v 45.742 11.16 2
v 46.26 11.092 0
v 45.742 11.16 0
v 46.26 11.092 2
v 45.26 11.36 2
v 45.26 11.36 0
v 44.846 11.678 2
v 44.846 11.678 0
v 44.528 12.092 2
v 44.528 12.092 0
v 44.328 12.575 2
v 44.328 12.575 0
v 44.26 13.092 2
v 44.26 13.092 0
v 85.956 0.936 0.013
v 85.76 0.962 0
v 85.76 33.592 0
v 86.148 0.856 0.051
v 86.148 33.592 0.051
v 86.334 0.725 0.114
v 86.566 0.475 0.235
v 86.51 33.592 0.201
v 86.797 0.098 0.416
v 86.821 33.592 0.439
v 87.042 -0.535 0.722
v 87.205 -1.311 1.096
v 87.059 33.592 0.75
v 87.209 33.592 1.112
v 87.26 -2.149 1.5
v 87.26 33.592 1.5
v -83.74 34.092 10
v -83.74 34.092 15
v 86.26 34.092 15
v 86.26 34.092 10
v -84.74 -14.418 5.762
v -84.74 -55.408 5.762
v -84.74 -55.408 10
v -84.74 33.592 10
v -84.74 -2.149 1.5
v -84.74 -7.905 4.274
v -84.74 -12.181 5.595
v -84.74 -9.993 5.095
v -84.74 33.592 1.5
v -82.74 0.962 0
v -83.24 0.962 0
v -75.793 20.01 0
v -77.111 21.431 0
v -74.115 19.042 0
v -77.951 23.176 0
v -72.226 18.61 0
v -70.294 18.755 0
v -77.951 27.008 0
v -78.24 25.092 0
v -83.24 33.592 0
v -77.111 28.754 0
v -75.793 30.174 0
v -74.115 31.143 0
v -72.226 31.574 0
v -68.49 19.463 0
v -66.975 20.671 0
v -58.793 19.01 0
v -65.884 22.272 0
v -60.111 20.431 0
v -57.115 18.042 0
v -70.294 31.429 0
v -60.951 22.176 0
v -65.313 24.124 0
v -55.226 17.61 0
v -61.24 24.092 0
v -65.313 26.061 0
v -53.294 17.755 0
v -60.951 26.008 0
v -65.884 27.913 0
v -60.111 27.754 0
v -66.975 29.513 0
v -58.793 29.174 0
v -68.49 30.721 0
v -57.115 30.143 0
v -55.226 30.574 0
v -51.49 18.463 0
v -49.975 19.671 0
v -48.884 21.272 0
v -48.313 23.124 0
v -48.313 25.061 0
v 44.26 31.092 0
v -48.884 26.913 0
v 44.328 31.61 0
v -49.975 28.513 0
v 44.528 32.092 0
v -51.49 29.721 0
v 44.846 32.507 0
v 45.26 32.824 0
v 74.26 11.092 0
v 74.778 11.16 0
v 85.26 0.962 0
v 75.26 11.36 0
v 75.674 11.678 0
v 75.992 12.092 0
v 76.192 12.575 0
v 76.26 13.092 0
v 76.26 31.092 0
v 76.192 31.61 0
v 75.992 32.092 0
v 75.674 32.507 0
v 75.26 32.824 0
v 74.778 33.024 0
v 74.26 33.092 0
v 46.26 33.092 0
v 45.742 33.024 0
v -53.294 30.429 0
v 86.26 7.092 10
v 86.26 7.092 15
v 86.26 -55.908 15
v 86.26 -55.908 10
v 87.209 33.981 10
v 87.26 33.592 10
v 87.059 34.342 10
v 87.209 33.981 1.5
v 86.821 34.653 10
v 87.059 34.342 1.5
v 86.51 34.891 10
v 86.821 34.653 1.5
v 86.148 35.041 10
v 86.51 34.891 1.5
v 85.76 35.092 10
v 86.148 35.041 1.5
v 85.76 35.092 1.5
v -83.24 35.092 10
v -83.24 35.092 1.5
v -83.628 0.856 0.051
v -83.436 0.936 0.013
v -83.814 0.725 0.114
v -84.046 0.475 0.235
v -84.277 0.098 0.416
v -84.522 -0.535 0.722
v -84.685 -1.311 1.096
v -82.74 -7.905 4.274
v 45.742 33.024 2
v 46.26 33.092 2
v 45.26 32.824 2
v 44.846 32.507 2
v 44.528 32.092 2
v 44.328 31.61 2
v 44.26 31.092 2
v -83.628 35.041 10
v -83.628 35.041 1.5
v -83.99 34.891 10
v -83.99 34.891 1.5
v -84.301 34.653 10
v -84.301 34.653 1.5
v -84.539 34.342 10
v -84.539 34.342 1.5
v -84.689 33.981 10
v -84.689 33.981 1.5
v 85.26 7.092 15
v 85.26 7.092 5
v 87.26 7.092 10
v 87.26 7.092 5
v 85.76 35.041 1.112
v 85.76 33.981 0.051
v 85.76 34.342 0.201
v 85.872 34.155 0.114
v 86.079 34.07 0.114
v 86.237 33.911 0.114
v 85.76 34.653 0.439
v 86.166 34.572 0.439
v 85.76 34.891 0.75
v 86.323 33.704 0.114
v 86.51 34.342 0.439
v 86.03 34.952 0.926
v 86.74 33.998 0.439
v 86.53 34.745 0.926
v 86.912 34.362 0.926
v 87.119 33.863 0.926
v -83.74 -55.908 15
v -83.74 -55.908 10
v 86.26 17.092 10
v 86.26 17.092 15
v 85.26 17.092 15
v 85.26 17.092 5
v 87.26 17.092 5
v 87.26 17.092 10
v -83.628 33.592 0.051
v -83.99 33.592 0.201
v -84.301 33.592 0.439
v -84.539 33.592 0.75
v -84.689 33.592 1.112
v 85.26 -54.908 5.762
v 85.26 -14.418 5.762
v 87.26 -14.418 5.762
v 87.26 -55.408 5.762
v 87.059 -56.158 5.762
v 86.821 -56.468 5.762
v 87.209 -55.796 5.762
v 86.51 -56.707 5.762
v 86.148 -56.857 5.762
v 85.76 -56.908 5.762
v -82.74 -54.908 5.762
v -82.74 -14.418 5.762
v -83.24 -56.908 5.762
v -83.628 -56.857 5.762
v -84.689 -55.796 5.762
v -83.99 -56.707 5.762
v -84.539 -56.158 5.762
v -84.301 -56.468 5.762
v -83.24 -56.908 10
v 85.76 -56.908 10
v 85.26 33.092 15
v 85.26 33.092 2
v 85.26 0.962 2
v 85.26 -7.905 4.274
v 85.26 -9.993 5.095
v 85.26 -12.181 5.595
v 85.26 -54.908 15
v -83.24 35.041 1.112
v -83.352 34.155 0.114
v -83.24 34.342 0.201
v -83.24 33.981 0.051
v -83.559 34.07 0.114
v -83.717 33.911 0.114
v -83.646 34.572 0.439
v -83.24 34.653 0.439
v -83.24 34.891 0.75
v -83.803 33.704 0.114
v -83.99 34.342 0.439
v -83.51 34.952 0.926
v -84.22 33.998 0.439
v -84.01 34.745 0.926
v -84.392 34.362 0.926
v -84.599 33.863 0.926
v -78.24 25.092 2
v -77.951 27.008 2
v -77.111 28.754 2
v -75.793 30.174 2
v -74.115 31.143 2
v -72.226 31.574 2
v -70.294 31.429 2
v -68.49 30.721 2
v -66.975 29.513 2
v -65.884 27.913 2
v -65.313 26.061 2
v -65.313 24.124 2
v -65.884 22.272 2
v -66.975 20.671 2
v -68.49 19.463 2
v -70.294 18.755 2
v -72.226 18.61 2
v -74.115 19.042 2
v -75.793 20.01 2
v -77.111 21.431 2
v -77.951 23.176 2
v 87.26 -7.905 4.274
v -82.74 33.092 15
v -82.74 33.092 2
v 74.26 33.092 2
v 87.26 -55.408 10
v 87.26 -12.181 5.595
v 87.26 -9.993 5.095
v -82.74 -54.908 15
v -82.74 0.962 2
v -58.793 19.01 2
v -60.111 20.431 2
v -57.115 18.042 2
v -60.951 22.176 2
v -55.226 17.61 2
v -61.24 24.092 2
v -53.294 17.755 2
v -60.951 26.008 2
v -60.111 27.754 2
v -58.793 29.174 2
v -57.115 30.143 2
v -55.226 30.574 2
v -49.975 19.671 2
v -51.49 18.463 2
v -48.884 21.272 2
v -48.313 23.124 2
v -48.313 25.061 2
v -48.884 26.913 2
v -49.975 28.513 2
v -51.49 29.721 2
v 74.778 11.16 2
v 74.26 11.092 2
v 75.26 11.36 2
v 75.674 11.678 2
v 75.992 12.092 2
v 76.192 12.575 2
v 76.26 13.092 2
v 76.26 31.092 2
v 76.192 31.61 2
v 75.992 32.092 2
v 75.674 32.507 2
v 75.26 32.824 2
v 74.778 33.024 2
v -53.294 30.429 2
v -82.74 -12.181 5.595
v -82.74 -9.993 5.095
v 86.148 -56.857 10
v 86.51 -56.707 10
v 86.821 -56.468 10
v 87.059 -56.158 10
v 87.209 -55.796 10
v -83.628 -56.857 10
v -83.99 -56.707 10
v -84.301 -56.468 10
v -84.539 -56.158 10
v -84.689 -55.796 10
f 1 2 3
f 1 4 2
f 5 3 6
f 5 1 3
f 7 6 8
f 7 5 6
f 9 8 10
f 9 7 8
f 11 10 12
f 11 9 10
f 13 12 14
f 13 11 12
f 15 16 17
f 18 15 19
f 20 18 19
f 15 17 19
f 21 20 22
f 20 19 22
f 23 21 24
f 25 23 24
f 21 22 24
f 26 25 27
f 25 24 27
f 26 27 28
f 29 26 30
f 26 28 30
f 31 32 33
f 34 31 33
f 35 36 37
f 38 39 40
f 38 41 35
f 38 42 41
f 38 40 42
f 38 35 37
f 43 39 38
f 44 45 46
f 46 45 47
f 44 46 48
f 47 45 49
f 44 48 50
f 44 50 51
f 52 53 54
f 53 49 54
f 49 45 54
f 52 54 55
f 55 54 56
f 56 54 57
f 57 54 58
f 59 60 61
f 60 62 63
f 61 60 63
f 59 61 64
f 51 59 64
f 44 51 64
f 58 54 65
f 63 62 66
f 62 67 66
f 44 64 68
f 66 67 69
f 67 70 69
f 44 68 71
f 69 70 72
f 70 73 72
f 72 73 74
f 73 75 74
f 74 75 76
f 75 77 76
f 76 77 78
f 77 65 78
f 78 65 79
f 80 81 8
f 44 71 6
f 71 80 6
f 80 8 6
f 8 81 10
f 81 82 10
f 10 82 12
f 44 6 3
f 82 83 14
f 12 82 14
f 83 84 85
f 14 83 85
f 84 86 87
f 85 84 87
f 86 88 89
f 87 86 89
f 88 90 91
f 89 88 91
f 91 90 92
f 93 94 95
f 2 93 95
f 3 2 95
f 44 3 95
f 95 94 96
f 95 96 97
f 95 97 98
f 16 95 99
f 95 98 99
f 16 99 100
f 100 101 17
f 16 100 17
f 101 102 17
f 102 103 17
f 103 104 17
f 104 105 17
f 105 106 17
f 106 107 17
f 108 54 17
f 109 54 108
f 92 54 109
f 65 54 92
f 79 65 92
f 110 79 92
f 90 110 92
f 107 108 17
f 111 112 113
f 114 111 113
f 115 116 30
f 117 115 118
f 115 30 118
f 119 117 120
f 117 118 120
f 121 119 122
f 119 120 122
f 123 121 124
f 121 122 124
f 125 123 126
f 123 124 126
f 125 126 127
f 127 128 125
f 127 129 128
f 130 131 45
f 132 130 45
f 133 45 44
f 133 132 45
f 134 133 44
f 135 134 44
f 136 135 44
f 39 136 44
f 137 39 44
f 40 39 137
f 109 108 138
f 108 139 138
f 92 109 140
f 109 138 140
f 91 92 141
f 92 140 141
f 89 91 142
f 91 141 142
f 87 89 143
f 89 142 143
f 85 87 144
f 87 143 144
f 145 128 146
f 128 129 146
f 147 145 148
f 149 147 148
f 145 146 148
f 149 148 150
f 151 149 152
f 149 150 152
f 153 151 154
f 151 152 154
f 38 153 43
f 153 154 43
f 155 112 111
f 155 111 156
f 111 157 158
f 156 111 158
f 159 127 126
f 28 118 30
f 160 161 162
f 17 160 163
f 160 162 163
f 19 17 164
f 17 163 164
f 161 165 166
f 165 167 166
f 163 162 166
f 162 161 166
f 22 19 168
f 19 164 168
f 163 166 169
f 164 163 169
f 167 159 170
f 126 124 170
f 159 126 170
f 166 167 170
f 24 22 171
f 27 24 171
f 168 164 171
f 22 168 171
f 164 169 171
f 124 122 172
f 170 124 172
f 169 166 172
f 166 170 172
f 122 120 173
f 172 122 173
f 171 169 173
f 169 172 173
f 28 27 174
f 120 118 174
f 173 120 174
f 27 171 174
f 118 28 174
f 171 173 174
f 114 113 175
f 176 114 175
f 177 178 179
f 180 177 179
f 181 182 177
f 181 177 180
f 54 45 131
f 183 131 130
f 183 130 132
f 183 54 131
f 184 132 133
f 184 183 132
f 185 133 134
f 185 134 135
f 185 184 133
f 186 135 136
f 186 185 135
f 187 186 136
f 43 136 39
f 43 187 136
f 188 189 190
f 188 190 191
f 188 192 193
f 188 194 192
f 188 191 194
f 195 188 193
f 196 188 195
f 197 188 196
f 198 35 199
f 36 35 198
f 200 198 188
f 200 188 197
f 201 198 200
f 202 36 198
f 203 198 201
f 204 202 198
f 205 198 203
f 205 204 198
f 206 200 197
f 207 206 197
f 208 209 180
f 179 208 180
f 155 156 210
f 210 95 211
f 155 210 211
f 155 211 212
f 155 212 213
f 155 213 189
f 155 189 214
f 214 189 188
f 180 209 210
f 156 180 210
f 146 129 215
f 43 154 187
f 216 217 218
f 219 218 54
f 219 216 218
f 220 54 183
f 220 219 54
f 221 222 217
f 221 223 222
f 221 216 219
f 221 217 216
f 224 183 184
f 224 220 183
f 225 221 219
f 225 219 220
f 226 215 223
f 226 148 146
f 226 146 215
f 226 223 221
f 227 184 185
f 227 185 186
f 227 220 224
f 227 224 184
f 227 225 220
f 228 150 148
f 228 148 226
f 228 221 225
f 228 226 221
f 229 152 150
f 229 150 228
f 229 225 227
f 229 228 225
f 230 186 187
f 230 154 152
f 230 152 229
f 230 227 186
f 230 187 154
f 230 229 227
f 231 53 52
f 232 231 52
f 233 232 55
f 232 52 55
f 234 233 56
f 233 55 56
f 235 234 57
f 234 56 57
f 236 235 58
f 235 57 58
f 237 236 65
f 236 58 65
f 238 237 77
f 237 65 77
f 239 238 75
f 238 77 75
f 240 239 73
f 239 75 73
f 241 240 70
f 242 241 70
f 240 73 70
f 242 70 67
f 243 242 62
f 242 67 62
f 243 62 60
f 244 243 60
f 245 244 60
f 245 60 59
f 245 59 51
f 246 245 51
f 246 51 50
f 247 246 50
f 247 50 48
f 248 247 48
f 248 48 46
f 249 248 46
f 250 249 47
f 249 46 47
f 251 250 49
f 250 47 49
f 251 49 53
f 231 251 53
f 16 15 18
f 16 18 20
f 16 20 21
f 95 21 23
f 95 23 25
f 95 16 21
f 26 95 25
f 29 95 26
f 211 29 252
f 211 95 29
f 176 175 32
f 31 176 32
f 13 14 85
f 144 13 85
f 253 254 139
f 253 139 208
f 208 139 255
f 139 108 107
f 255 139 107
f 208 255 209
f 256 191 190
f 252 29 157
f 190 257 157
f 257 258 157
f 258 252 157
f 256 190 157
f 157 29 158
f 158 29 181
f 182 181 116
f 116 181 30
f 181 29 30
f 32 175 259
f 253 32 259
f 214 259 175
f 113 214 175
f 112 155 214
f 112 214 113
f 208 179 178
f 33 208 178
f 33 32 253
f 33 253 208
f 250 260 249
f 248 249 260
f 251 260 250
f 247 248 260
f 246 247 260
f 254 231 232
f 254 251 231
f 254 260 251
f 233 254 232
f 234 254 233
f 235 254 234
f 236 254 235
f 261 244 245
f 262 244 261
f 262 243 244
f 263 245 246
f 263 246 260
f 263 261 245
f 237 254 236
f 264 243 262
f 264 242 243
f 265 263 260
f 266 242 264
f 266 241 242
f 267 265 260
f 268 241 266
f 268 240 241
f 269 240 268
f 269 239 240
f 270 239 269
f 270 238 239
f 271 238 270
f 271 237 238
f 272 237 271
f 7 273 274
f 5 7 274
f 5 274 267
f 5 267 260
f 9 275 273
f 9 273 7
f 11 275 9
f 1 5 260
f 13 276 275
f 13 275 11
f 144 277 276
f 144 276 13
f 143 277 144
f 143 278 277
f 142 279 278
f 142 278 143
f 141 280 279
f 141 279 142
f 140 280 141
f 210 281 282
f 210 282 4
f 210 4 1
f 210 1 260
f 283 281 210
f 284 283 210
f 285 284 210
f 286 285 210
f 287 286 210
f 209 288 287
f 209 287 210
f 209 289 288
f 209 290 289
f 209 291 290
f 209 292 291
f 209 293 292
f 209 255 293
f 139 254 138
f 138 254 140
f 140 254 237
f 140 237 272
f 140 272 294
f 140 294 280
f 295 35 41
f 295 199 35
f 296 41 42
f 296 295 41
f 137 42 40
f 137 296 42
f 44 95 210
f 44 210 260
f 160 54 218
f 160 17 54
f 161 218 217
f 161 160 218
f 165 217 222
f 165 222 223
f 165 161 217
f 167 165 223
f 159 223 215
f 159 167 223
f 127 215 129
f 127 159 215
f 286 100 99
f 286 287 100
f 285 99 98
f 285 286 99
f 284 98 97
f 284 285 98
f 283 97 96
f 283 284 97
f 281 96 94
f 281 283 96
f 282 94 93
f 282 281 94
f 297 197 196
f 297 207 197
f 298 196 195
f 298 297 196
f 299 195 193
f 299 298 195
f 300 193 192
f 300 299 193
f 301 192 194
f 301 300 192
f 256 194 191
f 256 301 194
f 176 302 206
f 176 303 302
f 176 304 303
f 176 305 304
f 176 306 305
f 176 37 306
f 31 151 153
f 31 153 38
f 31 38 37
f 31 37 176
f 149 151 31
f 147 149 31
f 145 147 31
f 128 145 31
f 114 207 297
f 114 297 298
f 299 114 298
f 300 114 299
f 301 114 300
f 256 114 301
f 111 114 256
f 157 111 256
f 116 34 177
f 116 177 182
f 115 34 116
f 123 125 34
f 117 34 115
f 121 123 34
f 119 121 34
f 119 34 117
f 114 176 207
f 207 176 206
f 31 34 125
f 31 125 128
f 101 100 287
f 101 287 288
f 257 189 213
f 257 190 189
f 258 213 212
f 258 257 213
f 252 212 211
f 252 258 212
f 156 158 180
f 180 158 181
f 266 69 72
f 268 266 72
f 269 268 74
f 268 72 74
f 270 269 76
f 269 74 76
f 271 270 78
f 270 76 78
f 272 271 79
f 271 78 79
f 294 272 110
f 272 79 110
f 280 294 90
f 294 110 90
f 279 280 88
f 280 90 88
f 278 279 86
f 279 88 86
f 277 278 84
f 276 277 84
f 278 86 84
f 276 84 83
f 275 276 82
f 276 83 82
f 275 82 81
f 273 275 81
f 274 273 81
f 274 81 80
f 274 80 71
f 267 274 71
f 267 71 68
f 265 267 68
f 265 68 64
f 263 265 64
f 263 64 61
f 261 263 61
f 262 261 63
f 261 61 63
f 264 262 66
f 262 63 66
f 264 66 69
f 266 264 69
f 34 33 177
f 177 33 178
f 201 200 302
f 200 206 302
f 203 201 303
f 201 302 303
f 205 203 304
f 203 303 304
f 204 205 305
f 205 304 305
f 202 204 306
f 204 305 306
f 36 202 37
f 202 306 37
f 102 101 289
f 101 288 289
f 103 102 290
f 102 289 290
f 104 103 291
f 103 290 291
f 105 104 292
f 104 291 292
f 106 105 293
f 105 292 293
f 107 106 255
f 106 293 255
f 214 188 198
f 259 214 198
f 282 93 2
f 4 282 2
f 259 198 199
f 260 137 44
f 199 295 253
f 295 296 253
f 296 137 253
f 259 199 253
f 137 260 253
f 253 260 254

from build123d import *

# Parameters (mm, degrees)
SKETCH_1_W               = 172
SKETCH_1_H               = 92
EXTRUDE_1_DEPTH          = 2
SKETCH_2_W               = 32
SKETCH_2_H               = 22
CUT_EXTRUDE_1_DEPTH      = 2
SKETCH_3_R               = 6.5
CUT_EXTRUDE_2_DEPTH      = 2
SKETCH_4_W               = 172
SKETCH_4_H               = 92
EXTRUDE_3_DEPTH          = 13
SKETCH_5_W               = 168
SKETCH_5_H               = 55.87
CUT_EXTRUDE_3_DEPTH      = 18
CUT_EXTRUDE_4_DEPTH      = 182.789670088
CUT_EXTRUDE_4_DEPTH_BACK = 172
FILLET_1_R               = 15
SKETCH_7_W               = 10
SKETCH_7_H               = 10
CUT_EXTRUDE_5_DEPTH      = 2
CUT_EXTRUDE_6_DEPTH      = 5
FILLET_2_R               = 2
FILLET_3_R               = 1.5


with BuildPart() as part:
    # 草图1 → 凸台-拉伸1 (new body)
    with BuildSketch(Plane.XY):
        with Locations((1.259970458, -10.907680945)):
            Rectangle(SKETCH_1_W, SKETCH_1_H)
    extrude(amount=EXTRUDE_1_DEPTH)

    # 草图2 → 切除-拉伸1 (cut)
    with BuildSketch(Plane(origin=(0, 0, 0), x_dir=(-1, 0, 0), z_dir=(0, 0, -1))):
        with Locations((-60.259970458, 22.092319055)):
            Rectangle(SKETCH_2_W, SKETCH_2_H)
    extrude(amount=-CUT_EXTRUDE_1_DEPTH, mode=Mode.SUBTRACT)

    # 草图3 → 切除-拉伸2 (cut)
    with BuildSketch(Plane(origin=(0, 0, 0), x_dir=(-1, 0, 0), z_dir=(0, 0, -1))):
        with Locations((54.740029542, 24.092319055)):
            Circle(SKETCH_3_R)
        with Locations((71.740029542, 25.092319055)):
            Circle(SKETCH_3_R)
    extrude(amount=-CUT_EXTRUDE_2_DEPTH, mode=Mode.SUBTRACT)

    # 草图4 → 凸台-拉伸3 (add)
    with BuildSketch(Plane.XY.offset(2)):
        with Locations((1.259970458, -10.907680945)):
            Rectangle(SKETCH_4_W, SKETCH_4_H)
        Polygon((-82.740029542, -54.907680945), (-82.740029542, 33.092319055), (44.259970458, 33.092319055), (76.259970458, 33.092319055), (85.259970458, 33.092319055), (85.259970458, -54.907680945), align=None, mode=Mode.SUBTRACT)
    extrude(amount=EXTRUDE_3_DEPTH)

    # 草图5 → 切除-拉伸3 (cut)
    with BuildSketch(Plane(origin=(0, 0, 0), x_dir=(-1, 0, 0), z_dir=(0, 0, -1))):
        with Locations((-1.259970458, -26.972680945)):
            Rectangle(SKETCH_5_W, SKETCH_5_H)
    extrude(amount=-CUT_EXTRUDE_3_DEPTH, mode=Mode.SUBTRACT)

    # 草图6 → 切除-拉伸4 (cut, two sides: drawn at the far end of the back side and taken through both)
    with BuildSketch(Plane(origin=(87.259970458, 0, 0), x_dir=(0, 0, -1), z_dir=(1, 0, 0)).offset(-CUT_EXTRUDE_4_DEPTH_BACK)):
        Polygon((84.64151075, 176.551763032), (0, 0.962319055), (-5.76238744, -10.991796575), (-5.76238744, -56.907680945), (-5.76238744, -251.832892702), (375.68654555, -332.33173887), (466.09044374, 96.052916865), align=None)
    extrude(amount=CUT_EXTRUDE_4_DEPTH + CUT_EXTRUDE_4_DEPTH_BACK, mode=Mode.SUBTRACT)

    # 圆角1
    fillet_1_edges = [part.edges().sort_by_distance(p)[0] for p in [
        (86.259970458, -10.991796575, 5.76238744),
        (-83.740029542, -10.991796575, 5.76238744),
    ]]
    fillet(fillet_1_edges, radius=FILLET_1_R)

    # 草图7 → 切除-拉伸5 (cut)
    with BuildSketch(Plane(origin=(87.259970458, 0, 0), x_dir=(0, 0, -1), z_dir=(1, 0, 0))):
        with Locations((-10, 12.092319055)):
            Rectangle(SKETCH_7_W, SKETCH_7_H)
    extrude(amount=-CUT_EXTRUDE_5_DEPTH, mode=Mode.SUBTRACT)

    # 草图8 → 切除-拉伸6 (cut)
    with BuildSketch(Plane.XY.offset(15)):
        Polygon((-83.740029542, -55.907680945), (-83.740029542, 34.092319055), (86.259970458, 34.092319055), (86.259970458, 17.092319055), (87.259970458, 17.092319055), (87.259970458, 35.092319055), (-84.740029542, 35.092319055), (-84.740029542, -56.907680945), (87.259970458, -56.907680945), (87.259970458, 7.092319055), (86.259970458, 7.092319055), (86.259970458, -55.907680945), align=None)
    extrude(amount=-CUT_EXTRUDE_6_DEPTH, mode=Mode.SUBTRACT)

    # 圆角2
    fillet_2_edges = [part.edges().sort_by_distance(p)[0] for p in [
        (76.259970458, 11.092319055, 1),
        (76.259970458, 33.092319055, 1),
        (44.259970458, 33.092319055, 1),
        (44.259970458, 11.092319055, 1),
    ]]
    fillet(fillet_2_edges, radius=FILLET_2_R)

    # 圆角3
    fillet_3_edges = [part.edges().sort_by_distance(p)[0] for p in [
        (-84.740029542, 35.092319055, 5),
        (87.259970458, 35.092319055, 5),
        (87.259970458, -56.907680945, 7.88119372),
        (-84.740029542, -56.907680945, 7.88119372),
        (1.259970458, 35.092319055, 0),
        (-84.740029542, 18.027319055, 0),
        (87.259970458, 18.027319055, 0),
    ]]
    fillet(fillet_3_edges, radius=FILLET_3_R)


solid = part.part
